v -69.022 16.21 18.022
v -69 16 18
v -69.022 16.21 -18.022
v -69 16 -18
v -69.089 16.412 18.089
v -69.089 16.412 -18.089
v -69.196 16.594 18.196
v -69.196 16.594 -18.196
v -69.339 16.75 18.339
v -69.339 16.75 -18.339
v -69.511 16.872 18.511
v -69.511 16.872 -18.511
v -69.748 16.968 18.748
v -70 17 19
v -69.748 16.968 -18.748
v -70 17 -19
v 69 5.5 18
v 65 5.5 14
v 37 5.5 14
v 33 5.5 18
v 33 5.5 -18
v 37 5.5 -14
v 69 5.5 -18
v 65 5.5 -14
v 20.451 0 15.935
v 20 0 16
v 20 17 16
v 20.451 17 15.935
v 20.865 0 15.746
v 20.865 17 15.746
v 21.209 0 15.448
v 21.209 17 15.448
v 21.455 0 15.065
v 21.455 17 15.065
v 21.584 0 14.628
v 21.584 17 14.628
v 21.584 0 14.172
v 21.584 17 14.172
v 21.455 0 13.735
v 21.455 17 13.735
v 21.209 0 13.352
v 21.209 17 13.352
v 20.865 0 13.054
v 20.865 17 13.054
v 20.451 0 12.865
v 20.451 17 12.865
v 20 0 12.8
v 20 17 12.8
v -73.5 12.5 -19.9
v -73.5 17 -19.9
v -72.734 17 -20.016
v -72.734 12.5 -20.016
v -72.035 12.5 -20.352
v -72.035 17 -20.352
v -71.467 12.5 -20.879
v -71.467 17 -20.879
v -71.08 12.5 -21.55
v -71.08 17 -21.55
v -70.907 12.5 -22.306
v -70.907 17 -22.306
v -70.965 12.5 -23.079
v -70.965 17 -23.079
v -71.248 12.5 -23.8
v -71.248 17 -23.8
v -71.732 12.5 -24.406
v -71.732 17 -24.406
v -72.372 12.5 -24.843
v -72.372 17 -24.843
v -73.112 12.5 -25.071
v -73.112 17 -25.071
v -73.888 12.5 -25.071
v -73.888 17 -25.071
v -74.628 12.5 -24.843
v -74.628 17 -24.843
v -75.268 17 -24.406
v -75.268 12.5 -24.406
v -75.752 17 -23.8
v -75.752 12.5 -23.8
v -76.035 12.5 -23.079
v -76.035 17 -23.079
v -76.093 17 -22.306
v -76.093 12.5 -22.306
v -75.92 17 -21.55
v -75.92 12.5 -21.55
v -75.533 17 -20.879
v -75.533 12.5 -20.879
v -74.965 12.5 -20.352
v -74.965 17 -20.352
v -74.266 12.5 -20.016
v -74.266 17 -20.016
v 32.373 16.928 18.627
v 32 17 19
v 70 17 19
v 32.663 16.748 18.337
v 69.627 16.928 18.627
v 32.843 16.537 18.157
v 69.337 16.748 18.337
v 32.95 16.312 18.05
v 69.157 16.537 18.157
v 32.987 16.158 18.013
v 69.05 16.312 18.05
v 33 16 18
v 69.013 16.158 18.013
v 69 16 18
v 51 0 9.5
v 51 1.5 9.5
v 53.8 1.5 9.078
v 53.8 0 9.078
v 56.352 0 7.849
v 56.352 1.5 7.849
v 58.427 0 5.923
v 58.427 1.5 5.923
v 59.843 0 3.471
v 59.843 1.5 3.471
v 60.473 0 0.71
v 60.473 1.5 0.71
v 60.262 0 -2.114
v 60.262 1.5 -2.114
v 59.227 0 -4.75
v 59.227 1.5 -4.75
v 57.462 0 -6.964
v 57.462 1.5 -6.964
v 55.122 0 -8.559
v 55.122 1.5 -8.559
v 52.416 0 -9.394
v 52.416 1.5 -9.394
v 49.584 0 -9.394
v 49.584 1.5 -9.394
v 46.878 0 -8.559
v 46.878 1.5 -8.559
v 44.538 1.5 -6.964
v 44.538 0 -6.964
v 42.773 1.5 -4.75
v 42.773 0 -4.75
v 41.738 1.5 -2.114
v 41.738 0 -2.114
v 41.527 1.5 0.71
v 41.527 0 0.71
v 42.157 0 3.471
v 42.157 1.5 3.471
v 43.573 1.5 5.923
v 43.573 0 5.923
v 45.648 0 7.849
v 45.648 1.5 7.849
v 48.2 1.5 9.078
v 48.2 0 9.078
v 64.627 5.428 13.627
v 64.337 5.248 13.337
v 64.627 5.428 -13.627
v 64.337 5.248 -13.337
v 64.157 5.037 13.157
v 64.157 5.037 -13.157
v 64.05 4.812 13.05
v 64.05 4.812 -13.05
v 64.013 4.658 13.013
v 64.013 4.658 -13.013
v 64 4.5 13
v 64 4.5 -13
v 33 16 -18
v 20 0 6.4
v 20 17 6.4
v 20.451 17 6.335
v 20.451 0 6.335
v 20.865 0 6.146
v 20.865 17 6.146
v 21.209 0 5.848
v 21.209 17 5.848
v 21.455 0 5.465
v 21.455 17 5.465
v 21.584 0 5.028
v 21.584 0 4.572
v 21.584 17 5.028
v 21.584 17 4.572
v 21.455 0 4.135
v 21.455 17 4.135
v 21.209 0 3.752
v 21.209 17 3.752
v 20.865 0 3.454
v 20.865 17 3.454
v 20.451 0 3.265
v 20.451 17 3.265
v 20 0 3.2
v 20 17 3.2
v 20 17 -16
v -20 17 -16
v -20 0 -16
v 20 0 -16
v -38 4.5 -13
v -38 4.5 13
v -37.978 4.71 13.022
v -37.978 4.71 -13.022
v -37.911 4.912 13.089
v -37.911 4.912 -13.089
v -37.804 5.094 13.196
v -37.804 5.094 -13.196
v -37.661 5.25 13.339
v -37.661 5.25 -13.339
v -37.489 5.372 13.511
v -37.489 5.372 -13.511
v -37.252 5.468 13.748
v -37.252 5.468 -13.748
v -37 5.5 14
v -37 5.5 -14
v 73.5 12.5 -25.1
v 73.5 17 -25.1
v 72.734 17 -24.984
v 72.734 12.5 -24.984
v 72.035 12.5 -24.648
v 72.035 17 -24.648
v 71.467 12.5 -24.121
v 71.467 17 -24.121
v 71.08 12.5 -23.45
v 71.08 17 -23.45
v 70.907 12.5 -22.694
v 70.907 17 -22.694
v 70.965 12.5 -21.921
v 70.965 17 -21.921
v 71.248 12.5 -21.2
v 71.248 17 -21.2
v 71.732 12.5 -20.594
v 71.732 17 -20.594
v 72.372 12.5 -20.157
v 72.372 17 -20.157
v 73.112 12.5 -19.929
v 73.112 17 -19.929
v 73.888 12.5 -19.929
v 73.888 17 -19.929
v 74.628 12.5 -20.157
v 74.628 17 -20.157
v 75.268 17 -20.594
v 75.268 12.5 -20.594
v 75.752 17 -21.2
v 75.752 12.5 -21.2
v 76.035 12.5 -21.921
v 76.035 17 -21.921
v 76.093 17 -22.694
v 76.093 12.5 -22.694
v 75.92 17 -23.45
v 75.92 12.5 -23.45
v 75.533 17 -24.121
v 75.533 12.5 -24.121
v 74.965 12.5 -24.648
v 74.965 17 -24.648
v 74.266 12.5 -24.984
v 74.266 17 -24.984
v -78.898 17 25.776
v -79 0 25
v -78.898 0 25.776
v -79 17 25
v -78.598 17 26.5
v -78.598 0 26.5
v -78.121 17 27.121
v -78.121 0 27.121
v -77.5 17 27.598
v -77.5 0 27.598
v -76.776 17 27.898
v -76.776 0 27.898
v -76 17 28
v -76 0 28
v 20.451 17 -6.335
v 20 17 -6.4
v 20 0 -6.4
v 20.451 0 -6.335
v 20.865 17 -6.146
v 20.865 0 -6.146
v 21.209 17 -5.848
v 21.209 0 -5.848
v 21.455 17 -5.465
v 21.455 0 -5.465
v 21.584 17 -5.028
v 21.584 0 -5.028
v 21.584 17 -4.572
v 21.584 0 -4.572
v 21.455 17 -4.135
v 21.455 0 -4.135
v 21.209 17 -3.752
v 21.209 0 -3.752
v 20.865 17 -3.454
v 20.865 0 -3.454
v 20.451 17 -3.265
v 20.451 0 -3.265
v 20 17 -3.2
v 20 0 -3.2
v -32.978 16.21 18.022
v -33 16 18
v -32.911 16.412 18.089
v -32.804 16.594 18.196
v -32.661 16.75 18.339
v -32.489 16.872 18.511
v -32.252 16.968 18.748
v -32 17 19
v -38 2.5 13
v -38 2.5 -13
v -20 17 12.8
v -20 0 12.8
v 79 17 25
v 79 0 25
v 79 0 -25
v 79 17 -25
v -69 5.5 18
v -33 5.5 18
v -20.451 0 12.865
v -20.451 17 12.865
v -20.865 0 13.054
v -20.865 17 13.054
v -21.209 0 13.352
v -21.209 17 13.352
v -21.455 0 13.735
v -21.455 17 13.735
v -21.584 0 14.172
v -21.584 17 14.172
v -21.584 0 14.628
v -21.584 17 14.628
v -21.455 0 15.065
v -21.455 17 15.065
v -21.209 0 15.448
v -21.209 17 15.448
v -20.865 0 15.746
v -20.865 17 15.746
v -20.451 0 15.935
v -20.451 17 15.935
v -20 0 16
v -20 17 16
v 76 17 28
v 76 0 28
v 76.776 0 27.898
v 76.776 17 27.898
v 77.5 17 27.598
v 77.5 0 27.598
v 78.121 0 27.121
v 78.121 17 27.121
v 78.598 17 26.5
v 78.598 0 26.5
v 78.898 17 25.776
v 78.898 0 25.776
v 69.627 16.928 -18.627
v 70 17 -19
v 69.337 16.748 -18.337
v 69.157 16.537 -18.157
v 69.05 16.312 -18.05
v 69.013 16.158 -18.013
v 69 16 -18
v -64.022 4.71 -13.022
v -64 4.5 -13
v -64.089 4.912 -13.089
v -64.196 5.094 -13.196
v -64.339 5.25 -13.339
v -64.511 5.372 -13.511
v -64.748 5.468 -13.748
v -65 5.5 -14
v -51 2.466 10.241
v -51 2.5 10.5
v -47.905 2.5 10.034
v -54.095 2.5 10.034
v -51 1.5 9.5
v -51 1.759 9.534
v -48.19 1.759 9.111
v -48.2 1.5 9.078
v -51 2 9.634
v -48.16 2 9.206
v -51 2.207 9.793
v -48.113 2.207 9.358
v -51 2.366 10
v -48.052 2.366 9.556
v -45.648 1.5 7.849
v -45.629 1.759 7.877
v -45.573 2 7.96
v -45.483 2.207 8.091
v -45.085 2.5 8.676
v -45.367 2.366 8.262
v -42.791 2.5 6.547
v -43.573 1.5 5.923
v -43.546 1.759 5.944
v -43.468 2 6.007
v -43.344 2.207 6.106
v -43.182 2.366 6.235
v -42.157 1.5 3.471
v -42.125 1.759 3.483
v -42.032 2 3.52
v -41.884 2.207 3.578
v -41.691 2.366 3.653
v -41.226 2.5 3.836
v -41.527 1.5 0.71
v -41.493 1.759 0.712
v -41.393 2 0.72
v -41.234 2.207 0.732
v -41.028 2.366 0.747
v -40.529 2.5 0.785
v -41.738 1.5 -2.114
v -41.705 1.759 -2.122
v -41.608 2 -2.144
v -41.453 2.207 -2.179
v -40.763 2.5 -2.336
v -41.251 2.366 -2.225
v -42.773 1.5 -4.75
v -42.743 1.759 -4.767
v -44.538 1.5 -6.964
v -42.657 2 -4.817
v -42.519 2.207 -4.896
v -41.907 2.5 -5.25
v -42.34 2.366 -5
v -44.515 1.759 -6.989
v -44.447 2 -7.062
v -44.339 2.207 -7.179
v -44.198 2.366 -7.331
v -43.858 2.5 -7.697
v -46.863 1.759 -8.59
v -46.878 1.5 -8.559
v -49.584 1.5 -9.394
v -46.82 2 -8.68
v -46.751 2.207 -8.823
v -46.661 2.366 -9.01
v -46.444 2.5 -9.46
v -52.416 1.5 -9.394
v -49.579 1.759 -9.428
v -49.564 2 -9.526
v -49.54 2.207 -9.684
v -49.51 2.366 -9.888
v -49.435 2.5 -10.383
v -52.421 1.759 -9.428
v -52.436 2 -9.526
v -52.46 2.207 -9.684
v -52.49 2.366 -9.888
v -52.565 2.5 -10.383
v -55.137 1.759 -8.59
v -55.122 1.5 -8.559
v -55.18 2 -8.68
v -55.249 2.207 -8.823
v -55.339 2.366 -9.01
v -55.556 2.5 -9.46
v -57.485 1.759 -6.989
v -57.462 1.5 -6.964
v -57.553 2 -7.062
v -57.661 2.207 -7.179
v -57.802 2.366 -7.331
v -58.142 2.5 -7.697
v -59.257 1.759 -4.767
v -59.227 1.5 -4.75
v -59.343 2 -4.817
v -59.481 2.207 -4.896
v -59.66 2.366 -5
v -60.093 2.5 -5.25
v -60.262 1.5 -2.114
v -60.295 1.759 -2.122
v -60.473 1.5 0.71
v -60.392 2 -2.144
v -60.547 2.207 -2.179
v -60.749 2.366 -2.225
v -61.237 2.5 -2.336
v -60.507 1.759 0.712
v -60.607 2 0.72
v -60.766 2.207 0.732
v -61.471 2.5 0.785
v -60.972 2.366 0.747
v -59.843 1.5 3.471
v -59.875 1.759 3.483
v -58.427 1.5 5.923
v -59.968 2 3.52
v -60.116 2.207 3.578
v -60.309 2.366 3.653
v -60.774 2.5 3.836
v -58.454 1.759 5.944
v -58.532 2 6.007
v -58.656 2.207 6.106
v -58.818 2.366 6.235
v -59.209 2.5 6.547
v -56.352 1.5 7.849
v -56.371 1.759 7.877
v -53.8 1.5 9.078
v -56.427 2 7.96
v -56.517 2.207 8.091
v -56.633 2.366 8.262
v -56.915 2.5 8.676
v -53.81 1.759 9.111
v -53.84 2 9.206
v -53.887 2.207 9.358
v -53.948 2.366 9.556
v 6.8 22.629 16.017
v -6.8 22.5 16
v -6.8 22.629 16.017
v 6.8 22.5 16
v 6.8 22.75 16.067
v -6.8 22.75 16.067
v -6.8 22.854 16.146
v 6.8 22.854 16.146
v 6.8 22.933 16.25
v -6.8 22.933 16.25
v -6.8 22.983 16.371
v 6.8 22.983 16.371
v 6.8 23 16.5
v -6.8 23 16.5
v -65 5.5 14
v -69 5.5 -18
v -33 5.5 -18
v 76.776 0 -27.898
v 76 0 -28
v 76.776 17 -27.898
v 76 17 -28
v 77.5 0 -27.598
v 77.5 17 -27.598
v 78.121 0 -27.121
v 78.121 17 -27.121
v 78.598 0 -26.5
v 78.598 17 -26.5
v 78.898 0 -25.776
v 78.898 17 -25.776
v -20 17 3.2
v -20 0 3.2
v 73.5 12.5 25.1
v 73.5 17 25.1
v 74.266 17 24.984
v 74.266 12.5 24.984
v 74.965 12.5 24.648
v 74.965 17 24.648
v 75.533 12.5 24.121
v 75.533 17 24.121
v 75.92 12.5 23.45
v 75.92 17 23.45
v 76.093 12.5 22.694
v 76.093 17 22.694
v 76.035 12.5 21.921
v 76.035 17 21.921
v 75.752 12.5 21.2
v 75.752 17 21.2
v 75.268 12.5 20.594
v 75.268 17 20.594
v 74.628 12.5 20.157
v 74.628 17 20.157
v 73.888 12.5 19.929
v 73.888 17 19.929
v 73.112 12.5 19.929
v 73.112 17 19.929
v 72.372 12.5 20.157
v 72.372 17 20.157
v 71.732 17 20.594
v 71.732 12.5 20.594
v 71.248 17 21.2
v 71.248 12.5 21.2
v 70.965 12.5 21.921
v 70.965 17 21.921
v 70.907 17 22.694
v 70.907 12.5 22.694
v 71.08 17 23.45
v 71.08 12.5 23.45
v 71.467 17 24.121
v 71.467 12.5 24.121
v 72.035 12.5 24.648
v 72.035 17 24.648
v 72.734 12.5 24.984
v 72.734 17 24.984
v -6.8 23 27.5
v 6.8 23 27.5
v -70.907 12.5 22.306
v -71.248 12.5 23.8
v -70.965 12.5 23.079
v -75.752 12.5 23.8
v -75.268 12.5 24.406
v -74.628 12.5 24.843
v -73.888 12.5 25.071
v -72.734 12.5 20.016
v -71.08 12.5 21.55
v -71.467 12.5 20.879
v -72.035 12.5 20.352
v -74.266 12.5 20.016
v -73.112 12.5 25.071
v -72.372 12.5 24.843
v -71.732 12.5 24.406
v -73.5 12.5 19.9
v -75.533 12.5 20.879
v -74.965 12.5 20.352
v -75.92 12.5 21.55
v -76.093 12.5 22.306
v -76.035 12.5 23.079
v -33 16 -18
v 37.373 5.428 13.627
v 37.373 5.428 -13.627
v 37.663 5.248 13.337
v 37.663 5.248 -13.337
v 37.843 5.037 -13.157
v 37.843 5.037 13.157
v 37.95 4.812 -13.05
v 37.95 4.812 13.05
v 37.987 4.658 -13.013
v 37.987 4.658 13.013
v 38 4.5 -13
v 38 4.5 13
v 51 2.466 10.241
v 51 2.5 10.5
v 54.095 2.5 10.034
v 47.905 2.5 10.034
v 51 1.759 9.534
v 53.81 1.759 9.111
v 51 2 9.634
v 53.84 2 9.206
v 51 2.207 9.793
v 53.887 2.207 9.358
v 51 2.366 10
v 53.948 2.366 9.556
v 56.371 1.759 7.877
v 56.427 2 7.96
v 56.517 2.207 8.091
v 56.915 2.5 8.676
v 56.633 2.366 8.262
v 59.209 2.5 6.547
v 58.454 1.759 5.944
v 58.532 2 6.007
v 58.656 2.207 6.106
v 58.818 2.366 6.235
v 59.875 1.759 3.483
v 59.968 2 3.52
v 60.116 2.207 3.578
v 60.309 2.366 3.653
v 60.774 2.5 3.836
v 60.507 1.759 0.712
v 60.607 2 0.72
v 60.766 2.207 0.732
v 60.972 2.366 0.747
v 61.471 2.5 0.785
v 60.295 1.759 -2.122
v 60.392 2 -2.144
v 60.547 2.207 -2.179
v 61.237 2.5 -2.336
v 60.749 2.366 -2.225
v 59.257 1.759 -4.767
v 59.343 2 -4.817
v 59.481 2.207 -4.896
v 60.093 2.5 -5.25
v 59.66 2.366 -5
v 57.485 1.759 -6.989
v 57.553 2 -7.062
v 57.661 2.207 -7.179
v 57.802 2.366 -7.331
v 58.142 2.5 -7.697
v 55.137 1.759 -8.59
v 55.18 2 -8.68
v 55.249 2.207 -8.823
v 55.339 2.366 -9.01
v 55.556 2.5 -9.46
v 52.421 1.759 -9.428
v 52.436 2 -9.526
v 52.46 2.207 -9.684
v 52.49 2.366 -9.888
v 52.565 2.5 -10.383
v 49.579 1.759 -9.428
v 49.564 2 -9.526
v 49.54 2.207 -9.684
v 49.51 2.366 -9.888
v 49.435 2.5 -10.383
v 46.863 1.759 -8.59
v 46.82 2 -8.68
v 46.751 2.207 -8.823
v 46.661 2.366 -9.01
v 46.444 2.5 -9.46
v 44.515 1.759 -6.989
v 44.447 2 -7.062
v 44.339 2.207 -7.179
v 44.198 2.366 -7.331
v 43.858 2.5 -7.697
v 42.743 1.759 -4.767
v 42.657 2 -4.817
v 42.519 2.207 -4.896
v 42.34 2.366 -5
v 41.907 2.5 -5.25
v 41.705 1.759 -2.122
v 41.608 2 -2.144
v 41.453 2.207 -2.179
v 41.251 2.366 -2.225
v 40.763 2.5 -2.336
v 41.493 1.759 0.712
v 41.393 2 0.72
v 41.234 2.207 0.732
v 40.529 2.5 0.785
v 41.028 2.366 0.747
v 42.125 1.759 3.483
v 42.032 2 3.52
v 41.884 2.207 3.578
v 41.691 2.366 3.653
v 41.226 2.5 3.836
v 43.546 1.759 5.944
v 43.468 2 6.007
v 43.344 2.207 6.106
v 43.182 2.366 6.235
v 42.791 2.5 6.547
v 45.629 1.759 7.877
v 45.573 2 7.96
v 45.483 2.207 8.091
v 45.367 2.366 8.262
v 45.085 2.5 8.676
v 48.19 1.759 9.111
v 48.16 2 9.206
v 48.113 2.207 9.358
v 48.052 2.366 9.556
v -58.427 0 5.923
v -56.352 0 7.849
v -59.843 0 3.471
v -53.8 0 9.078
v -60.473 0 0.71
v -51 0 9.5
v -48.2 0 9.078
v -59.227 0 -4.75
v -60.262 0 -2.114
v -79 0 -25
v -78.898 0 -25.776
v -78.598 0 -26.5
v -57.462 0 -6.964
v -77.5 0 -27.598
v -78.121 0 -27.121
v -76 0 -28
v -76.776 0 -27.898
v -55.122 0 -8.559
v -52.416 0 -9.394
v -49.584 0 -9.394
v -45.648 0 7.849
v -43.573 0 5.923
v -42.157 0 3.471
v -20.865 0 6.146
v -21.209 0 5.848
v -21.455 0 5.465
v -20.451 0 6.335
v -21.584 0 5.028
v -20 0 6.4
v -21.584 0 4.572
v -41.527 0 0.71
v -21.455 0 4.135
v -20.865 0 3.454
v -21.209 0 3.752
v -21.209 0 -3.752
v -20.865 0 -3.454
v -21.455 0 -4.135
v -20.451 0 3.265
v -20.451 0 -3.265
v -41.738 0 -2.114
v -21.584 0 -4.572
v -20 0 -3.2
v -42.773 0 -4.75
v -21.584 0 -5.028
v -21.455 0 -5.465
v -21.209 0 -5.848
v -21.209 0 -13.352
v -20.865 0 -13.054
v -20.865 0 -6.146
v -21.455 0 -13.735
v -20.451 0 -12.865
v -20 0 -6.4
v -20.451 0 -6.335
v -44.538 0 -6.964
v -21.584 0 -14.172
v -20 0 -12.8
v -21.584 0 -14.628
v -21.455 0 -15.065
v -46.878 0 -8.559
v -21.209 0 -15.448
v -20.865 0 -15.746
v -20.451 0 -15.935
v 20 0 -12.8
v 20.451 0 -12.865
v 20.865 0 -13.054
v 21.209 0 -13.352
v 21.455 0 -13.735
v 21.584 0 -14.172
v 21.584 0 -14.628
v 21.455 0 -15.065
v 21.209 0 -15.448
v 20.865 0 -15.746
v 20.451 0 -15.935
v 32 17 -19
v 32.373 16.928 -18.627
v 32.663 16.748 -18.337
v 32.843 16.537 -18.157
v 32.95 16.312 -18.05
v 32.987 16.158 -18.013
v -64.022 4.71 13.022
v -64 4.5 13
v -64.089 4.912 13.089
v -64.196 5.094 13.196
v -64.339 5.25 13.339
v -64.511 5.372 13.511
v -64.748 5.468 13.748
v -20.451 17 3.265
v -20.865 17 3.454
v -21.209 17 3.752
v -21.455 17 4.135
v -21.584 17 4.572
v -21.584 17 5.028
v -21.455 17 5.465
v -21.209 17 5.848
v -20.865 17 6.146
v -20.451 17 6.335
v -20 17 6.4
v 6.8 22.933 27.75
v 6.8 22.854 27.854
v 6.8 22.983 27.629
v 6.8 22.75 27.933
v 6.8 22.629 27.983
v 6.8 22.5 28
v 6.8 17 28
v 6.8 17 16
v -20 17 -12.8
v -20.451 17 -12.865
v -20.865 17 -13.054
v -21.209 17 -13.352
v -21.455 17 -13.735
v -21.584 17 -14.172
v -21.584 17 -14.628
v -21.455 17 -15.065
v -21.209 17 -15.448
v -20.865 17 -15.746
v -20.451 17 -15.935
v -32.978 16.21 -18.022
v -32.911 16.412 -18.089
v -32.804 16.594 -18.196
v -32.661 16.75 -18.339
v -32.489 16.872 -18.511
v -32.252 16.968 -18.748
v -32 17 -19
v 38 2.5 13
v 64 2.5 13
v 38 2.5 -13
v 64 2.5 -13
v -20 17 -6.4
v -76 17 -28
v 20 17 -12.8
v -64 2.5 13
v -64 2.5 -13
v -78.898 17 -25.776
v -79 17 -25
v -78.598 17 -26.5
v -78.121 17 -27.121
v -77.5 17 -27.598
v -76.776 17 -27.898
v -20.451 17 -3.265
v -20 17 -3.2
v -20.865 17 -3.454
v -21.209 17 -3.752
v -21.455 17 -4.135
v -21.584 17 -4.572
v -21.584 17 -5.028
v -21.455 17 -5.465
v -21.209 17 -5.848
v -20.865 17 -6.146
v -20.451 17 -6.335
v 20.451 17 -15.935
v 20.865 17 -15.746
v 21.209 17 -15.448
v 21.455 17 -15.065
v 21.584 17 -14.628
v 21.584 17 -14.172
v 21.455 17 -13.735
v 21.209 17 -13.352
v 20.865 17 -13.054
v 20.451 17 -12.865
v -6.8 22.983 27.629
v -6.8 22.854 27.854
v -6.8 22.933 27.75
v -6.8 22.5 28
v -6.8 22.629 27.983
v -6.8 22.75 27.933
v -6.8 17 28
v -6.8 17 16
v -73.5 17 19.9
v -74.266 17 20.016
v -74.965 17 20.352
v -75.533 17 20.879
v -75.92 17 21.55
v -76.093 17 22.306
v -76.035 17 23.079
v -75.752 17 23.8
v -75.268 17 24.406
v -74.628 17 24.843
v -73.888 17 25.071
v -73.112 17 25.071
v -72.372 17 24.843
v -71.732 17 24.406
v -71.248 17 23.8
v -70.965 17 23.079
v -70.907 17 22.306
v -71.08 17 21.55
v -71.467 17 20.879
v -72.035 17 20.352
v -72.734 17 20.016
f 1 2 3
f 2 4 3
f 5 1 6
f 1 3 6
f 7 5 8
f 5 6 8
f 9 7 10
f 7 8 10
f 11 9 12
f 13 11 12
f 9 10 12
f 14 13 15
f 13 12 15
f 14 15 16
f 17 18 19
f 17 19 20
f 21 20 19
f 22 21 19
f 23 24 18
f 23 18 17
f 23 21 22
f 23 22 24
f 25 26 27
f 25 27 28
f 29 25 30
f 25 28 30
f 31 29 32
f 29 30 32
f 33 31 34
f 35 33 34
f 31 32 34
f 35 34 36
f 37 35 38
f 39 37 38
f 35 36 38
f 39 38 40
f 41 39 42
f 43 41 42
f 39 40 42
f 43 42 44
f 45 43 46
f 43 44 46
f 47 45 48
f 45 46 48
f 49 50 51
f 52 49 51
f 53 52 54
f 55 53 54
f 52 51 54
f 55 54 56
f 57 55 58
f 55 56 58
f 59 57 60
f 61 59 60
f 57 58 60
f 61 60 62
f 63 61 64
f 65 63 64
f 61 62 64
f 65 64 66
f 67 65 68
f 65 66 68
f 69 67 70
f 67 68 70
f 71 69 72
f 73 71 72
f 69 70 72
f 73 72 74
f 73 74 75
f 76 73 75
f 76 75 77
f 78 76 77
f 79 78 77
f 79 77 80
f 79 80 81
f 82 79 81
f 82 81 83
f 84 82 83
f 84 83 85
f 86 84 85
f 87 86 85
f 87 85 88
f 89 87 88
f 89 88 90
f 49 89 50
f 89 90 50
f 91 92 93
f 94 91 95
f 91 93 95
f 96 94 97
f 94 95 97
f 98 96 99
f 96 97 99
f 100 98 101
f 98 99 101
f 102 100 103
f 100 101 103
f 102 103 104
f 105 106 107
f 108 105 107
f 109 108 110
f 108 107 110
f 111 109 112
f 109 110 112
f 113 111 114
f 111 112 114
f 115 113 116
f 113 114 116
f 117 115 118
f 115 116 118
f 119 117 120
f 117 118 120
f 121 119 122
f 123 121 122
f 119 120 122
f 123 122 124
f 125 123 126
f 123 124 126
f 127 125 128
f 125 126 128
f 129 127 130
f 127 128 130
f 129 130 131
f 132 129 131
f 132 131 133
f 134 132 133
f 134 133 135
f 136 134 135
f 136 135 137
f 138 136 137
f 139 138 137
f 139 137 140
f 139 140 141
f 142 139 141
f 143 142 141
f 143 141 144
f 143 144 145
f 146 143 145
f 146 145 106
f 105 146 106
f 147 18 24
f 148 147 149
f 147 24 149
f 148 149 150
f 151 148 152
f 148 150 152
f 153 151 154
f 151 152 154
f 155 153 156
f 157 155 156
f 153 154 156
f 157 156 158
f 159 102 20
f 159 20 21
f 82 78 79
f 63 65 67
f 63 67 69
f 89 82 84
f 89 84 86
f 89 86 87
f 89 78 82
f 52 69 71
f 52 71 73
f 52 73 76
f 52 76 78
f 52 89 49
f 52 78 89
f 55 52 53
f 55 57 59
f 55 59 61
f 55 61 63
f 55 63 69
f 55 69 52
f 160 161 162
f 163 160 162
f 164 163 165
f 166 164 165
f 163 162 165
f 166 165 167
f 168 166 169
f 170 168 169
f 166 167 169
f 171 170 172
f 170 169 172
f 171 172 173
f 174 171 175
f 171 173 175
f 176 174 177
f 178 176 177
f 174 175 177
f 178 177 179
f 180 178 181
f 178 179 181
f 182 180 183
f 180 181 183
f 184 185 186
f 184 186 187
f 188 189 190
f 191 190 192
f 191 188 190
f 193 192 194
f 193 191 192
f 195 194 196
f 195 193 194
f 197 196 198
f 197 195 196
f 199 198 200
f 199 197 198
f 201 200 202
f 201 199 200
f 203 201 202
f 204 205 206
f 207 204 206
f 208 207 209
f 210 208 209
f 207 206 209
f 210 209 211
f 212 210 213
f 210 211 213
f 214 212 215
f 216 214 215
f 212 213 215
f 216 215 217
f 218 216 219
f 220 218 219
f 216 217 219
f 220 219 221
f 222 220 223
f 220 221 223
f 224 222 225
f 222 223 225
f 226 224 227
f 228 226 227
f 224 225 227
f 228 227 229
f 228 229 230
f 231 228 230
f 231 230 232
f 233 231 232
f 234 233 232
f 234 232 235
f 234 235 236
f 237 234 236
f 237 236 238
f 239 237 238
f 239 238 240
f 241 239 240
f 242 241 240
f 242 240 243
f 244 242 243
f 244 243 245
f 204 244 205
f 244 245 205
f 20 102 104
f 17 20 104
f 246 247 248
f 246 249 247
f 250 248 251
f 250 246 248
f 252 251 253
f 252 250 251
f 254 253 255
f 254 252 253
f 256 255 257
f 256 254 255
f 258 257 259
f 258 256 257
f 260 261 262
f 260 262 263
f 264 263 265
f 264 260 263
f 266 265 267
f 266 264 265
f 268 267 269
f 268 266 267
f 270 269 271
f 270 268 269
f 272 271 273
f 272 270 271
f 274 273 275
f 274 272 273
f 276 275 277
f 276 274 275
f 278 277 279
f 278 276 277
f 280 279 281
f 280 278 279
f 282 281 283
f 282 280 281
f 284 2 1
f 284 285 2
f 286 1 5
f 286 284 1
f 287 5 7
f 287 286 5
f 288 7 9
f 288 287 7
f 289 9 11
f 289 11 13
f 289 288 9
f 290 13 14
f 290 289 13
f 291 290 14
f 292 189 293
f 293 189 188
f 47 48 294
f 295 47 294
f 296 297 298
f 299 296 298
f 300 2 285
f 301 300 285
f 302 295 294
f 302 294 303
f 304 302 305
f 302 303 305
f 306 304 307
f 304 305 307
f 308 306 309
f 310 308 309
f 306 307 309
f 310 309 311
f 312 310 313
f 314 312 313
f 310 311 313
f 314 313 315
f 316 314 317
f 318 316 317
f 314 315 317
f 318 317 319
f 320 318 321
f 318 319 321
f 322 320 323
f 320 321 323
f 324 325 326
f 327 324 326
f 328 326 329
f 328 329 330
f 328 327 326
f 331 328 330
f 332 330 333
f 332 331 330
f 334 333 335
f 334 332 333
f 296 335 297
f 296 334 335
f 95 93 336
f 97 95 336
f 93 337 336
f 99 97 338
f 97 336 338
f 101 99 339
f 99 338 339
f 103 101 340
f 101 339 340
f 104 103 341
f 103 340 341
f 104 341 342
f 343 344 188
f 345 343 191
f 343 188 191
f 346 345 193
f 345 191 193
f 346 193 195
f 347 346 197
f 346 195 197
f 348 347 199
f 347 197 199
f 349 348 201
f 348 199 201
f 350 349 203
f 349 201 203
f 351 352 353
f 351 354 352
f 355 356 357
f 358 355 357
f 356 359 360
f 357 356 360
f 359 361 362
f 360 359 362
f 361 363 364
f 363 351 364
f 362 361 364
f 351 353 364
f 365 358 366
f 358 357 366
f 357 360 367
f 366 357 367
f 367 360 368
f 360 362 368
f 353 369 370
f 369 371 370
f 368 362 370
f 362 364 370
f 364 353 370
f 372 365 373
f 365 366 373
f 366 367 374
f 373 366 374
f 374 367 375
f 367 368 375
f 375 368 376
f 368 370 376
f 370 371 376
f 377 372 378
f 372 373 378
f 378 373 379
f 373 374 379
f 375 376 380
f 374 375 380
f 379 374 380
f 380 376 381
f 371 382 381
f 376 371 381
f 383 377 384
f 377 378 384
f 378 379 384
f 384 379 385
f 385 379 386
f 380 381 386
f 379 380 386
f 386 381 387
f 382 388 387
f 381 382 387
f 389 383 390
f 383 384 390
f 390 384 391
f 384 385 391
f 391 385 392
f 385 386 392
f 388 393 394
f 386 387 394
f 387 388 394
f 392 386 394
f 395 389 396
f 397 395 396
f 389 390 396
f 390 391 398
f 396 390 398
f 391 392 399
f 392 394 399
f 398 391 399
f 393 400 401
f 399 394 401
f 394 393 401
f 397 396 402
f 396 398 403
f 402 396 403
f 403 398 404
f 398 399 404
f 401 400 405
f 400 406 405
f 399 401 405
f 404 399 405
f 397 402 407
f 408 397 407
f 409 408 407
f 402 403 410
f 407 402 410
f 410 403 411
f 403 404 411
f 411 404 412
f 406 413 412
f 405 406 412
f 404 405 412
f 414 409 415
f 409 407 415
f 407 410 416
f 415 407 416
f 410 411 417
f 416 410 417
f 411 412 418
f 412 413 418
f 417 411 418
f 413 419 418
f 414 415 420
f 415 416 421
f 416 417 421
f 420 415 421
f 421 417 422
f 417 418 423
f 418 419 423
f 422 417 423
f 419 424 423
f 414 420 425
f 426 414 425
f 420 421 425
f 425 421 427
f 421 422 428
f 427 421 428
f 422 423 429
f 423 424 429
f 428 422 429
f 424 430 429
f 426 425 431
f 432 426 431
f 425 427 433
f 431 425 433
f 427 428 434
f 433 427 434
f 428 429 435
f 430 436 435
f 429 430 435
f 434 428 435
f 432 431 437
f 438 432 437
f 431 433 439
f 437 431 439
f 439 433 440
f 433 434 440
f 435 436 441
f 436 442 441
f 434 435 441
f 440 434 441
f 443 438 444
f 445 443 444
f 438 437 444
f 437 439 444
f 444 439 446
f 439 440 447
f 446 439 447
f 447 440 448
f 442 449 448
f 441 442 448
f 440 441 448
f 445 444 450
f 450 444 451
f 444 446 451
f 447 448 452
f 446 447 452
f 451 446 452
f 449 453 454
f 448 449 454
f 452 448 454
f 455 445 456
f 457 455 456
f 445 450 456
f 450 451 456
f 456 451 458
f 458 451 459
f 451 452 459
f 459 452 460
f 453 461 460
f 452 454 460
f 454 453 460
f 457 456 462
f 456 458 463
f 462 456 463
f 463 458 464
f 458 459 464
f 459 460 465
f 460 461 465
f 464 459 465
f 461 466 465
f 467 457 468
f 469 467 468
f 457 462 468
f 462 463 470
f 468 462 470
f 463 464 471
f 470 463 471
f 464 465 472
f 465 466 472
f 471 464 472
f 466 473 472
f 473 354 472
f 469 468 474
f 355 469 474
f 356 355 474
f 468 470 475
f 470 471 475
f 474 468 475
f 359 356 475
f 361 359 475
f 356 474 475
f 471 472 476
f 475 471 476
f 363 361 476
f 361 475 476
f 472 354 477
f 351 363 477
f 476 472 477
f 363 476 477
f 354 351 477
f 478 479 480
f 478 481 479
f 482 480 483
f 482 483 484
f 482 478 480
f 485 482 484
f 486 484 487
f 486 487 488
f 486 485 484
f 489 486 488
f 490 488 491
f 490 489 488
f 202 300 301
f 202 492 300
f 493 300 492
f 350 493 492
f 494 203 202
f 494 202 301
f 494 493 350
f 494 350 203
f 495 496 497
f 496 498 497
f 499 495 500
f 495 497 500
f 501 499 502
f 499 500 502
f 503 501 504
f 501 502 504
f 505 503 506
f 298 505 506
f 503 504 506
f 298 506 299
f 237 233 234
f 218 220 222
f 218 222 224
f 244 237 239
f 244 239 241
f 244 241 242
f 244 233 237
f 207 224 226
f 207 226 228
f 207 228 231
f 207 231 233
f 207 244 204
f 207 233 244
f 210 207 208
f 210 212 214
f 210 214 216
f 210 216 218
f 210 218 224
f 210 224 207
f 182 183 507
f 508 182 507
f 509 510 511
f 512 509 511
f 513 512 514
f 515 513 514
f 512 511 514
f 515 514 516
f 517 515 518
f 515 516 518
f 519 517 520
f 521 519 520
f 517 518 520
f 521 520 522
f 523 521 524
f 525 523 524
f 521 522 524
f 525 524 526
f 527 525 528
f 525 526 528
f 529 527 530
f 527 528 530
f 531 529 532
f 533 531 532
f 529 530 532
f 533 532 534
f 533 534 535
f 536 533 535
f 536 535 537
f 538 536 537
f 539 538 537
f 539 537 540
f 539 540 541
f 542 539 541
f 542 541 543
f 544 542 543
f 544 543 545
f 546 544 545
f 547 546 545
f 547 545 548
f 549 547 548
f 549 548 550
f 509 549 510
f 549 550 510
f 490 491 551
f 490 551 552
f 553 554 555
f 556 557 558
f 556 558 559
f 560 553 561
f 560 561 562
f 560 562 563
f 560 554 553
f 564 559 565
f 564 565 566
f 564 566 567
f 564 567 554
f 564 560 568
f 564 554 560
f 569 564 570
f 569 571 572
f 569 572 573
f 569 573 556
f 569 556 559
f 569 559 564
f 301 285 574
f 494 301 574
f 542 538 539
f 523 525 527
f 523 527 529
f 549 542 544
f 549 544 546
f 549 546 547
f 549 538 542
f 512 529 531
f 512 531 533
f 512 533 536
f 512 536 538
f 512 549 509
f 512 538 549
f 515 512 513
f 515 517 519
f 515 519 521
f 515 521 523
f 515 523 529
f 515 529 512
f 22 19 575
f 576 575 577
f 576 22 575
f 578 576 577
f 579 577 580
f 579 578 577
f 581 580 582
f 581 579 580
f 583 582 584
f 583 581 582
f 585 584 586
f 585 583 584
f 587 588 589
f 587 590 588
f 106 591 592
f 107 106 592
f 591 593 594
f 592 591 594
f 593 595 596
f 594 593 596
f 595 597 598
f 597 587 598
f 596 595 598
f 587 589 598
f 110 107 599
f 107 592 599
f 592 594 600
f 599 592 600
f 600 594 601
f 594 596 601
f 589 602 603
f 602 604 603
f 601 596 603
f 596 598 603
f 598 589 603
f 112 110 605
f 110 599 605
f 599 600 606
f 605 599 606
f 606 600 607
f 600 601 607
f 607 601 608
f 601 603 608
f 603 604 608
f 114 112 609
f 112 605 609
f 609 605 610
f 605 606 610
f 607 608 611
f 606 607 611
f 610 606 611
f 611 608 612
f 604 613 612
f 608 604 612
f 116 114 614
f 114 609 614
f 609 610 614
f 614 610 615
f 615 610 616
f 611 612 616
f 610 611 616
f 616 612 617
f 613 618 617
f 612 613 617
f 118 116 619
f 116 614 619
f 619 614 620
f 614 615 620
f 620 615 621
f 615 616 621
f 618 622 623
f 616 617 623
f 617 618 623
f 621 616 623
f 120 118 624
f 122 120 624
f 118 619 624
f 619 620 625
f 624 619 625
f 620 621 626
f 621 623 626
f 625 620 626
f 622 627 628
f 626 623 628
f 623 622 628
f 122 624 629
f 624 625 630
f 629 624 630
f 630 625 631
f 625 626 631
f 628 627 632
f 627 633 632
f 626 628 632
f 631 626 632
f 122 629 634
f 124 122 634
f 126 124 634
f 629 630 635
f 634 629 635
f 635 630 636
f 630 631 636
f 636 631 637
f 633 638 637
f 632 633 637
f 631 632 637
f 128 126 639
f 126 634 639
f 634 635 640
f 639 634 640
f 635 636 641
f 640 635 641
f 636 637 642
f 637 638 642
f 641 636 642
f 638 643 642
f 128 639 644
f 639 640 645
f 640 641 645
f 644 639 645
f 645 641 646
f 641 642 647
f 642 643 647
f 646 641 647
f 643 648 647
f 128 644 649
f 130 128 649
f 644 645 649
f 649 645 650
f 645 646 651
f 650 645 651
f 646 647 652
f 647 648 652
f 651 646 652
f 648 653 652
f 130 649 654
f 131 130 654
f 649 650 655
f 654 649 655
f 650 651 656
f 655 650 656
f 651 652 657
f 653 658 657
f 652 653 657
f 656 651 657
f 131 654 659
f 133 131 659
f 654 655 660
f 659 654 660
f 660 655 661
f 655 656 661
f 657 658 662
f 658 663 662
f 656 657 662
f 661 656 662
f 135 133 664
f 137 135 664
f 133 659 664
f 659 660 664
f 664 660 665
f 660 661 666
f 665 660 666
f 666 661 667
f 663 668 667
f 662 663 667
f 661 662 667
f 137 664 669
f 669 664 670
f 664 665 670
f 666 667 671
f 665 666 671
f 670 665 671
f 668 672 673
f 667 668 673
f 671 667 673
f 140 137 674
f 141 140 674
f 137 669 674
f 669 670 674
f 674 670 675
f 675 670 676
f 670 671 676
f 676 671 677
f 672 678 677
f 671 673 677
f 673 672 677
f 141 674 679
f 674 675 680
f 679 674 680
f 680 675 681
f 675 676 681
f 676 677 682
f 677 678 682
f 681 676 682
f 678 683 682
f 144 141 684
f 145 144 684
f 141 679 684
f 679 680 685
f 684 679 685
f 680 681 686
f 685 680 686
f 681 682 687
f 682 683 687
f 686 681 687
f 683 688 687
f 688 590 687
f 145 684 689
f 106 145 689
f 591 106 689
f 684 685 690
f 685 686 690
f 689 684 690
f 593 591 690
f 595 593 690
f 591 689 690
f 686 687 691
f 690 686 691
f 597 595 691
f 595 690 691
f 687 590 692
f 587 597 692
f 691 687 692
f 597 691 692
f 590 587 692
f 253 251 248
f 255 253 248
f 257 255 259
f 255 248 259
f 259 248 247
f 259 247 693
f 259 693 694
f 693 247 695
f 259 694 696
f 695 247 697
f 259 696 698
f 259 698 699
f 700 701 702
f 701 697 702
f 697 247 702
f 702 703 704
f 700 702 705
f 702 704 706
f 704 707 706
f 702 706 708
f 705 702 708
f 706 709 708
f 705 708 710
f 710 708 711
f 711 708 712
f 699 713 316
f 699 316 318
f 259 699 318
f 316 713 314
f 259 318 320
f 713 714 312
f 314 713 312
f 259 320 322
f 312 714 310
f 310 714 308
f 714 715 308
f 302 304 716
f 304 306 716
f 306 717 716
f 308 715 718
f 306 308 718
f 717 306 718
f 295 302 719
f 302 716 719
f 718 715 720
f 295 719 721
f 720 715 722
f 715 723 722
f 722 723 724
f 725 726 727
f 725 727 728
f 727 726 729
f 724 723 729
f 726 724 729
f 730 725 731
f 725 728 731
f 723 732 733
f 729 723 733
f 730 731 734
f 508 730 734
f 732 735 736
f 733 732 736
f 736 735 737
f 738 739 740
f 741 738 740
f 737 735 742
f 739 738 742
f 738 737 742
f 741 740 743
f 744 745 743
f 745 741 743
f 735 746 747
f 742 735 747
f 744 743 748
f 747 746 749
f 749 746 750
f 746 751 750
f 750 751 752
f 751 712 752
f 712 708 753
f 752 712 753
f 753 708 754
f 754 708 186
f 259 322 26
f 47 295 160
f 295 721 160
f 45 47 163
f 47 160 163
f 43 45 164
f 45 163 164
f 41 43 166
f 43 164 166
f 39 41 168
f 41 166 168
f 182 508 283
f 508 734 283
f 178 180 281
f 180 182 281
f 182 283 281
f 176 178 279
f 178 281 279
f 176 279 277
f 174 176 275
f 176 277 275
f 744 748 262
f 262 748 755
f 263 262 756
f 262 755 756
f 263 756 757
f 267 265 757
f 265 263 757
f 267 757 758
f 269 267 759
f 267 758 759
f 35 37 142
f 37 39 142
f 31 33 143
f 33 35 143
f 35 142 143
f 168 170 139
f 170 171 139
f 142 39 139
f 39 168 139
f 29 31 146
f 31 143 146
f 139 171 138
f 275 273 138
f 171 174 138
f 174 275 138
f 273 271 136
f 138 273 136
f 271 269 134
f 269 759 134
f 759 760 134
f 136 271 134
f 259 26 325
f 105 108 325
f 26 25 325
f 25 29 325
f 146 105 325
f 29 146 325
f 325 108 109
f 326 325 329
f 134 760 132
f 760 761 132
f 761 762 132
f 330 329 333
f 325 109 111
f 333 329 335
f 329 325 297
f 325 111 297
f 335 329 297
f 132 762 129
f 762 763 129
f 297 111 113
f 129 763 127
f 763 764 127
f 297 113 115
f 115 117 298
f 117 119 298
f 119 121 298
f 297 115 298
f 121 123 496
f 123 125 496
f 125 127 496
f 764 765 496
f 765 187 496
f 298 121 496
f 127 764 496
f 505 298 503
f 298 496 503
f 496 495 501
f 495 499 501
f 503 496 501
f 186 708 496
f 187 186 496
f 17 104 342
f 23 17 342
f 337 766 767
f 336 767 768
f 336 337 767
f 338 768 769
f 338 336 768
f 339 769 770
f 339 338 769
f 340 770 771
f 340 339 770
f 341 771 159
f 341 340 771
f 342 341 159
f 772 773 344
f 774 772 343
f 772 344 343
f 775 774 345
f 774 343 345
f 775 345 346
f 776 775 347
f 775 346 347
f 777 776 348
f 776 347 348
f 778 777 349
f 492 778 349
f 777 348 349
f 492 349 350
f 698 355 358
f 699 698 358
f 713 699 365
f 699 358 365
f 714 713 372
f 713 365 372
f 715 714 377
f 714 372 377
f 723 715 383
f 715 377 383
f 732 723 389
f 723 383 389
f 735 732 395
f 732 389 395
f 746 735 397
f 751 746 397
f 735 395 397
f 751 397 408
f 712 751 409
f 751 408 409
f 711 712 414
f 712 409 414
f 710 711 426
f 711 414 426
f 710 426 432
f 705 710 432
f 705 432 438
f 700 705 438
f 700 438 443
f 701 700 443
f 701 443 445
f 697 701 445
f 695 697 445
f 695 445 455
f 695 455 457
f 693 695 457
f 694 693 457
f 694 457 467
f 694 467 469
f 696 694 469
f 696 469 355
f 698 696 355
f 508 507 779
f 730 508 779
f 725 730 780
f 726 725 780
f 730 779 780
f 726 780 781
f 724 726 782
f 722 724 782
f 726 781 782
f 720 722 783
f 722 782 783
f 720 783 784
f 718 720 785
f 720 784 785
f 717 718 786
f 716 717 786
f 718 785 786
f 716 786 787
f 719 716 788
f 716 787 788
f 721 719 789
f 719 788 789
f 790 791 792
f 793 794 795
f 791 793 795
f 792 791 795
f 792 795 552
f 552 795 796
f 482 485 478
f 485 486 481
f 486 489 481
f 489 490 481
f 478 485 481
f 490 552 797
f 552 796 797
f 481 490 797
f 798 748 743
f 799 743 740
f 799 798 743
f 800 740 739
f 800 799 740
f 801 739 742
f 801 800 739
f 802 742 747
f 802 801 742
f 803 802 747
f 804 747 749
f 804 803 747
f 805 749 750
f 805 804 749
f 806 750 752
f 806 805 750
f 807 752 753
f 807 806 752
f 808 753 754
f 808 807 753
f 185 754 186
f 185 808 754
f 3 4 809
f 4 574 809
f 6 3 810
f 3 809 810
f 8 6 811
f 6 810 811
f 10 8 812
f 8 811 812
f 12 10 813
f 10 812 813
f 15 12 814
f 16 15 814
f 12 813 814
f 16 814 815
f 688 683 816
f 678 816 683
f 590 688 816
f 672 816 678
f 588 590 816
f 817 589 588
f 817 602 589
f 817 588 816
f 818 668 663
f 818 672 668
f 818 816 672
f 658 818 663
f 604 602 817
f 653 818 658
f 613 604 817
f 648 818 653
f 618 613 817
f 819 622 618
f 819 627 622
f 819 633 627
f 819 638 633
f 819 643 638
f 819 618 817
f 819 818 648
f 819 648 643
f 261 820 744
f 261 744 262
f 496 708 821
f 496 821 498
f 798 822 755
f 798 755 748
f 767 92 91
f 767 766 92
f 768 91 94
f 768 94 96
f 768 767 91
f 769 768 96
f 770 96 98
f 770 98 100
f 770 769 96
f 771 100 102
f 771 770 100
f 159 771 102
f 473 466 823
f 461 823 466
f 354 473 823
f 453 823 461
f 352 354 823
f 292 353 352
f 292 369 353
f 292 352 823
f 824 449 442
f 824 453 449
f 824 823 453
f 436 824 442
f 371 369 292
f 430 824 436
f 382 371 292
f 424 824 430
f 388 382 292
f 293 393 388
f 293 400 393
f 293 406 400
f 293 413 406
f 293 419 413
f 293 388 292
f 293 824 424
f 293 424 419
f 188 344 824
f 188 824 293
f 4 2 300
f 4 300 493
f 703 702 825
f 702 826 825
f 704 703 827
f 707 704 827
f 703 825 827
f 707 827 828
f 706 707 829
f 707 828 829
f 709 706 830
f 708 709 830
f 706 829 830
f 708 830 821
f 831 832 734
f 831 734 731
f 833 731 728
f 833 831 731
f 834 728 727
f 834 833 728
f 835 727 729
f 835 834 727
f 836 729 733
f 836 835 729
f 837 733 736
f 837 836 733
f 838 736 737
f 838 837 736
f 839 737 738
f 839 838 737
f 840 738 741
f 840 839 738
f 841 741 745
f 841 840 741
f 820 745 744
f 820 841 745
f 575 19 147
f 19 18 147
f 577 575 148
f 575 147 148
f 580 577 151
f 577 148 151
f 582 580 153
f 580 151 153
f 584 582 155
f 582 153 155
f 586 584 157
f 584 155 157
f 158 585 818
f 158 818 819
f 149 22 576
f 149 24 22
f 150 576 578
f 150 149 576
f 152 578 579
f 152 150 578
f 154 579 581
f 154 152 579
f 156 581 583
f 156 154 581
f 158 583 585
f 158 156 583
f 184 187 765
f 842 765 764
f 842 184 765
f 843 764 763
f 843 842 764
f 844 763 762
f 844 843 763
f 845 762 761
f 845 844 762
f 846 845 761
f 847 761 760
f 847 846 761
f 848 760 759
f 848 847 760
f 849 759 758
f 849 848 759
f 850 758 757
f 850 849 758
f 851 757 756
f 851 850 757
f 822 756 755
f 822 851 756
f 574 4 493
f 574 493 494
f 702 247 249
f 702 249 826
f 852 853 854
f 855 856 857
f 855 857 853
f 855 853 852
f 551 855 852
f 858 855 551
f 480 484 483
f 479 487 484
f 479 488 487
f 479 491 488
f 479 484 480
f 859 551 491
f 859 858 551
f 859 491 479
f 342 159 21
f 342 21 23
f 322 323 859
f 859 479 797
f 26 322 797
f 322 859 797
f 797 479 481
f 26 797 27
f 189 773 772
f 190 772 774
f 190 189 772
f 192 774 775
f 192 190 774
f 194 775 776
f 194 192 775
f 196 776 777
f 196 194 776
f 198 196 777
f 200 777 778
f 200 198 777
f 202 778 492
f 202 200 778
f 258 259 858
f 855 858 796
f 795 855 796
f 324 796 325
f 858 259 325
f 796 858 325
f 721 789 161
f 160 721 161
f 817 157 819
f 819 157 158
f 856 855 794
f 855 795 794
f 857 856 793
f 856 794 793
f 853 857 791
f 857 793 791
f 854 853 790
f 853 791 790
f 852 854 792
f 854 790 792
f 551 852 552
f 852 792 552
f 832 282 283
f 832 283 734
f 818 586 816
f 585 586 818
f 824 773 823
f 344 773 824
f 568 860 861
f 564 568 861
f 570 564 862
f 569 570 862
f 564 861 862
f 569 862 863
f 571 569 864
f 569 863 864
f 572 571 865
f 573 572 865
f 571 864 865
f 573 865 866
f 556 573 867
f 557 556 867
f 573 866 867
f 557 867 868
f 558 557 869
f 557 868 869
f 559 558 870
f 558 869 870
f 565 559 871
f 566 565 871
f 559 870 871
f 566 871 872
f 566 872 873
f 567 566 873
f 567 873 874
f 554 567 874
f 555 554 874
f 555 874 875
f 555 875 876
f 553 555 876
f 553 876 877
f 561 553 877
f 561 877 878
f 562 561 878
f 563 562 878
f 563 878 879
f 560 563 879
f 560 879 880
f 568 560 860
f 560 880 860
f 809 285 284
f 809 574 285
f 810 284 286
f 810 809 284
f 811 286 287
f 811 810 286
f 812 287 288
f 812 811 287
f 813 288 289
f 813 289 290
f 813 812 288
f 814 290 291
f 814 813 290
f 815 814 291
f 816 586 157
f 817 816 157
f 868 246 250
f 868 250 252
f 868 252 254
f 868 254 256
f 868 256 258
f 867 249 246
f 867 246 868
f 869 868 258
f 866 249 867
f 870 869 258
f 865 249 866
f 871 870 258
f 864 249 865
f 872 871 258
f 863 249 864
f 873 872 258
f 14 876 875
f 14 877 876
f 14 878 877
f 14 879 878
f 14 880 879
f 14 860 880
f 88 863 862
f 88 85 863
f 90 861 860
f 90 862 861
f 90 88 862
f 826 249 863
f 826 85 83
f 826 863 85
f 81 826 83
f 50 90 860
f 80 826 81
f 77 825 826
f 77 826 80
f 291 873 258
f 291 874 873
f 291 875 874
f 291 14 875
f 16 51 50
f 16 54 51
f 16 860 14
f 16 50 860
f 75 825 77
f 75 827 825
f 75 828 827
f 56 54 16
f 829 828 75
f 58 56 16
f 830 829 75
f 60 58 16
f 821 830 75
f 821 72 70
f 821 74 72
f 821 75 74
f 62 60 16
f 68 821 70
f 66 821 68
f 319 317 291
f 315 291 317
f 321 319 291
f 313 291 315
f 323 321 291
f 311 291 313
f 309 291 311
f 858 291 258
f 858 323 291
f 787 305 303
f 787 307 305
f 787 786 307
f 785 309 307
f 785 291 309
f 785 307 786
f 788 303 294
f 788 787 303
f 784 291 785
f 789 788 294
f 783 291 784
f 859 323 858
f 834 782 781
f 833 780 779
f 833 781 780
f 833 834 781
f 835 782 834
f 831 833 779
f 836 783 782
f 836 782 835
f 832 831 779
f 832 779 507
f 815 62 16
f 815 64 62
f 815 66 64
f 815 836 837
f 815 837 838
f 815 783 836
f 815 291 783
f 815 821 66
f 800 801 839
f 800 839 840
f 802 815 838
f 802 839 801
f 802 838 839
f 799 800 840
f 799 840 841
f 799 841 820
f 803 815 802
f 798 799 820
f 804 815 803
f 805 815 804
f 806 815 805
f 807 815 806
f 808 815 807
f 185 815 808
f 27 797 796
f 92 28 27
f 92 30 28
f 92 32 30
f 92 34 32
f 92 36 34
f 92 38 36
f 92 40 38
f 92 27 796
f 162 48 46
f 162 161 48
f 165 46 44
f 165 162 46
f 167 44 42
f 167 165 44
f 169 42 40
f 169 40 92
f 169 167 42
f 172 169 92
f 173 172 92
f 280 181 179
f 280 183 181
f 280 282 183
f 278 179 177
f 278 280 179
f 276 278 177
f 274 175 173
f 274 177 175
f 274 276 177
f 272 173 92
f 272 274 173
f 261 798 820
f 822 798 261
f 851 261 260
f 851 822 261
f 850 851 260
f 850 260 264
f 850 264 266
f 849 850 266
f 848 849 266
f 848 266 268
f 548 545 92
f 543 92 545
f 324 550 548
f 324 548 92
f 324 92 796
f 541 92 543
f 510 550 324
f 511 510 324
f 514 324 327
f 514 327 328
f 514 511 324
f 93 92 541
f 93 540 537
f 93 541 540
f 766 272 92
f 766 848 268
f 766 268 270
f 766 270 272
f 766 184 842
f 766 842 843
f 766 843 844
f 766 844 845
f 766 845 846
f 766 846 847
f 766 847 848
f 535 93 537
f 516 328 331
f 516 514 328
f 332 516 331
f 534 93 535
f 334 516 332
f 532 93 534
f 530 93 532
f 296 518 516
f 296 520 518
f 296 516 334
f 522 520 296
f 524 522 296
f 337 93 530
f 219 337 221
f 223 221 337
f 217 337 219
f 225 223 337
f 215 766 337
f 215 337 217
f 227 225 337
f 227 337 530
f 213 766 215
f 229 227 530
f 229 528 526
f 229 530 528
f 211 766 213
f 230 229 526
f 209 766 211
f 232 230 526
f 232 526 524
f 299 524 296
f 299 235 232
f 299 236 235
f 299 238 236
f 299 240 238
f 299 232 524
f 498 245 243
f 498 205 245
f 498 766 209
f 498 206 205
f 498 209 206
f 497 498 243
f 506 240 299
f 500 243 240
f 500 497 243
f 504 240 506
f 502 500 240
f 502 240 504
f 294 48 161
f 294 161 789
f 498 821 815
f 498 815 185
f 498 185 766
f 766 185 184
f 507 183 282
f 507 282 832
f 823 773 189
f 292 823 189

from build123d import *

# Parameters (mm, degrees)
SKETCH1_W           = 158
SKETCH1_H           = 56
BOSS_EXTRUDE1_DEPTH = 17
SKETCH8_W           = 13.6
SKETCH8_H           = 12
BOSS_EXTRUDE2_DEPTH = 6
SKETCH2_W           = 36
SKETCH2_H           = 36
CUT_EXTRUDE1_DEPTH  = 11.5
SKETCH3_W           = 26
SKETCH3_H           = 26
CUT_EXTRUDE2_DEPTH  = 3
CUT_EXTRUDE3_REACH  = 88.286
SKETCH4_R           = 9.5
SKETCH5_R           = 2.6
CUT_EXTRUDE4_DEPTH  = 4.5
CUT_EXTRUDE5_REACH  = 87.522
FILLET1_R           = 3
FILLET2_R           = 1
FILLET3_R           = 1
FILLET4_R           = 1
FILLET5_R           = 0.5


with BuildPart() as part:
    # Sketch1 → Boss-Extrude1 (new body)
    with BuildSketch(Plane(origin=(0, 0, 0), x_dir=(1, 0, 0), z_dir=(0, 1, 0))):
        Rectangle(SKETCH1_W, SKETCH1_H)
    extrude(amount=BOSS_EXTRUDE1_DEPTH)

    # Sketch8 → Boss-Extrude2 (add)
    with BuildSketch(Plane(origin=(0, 17, 0), x_dir=(1, 0, 0), z_dir=(0, 1, 0))):
        with Locations((0, -22)):
            Rectangle(SKETCH8_W, SKETCH8_H)
    extrude(amount=BOSS_EXTRUDE2_DEPTH)

    # Sketch2 → Cut-Extrude1 (cut)
    with BuildSketch(Plane(origin=(0, 17, 0), x_dir=(1, 0, 0), z_dir=(0, 1, 0))):
        with Locations((-51, 0)):
            Rectangle(SKETCH2_W, SKETCH2_H)
        with Locations((51, 0)):
            Rectangle(SKETCH2_W, SKETCH2_H)
    extrude(amount=-CUT_EXTRUDE1_DEPTH, mode=Mode.SUBTRACT)

    # Sketch3 → Cut-Extrude2 (cut)
    with BuildSketch(Plane(origin=(0, 5.5, 0), x_dir=(1, 0, 0), z_dir=(0, 1, 0))):
        with Locations((51, 0)):
            Rectangle(SKETCH3_W, SKETCH3_H)
        with Locations((-51, 0)):
            Rectangle(SKETCH3_W, SKETCH3_H)
    extrude(amount=-CUT_EXTRUDE2_DEPTH, mode=Mode.SUBTRACT)

    # Sketch4 → Cut-Extrude3 (cut, up to next)
    with BuildSketch(Plane(origin=(0, 2.5, 0), x_dir=(1, 0, 0), z_dir=(0, 1, 0)), mode=Mode.PRIVATE) as cut_extrude3_sk1:
        with Locations(Location((-51, 0, 0), (0, 0, 270))):
            Circle(SKETCH4_R)
    cut_extrude3_tool1 = extrude(cut_extrude3_sk1.sketch, amount=-CUT_EXTRUDE3_REACH, mode=Mode.PRIVATE) & part.part
    # Sketch4 → Cut-Extrude3 (cut, up to next)
    with BuildSketch(Plane(origin=(0, 2.5, 0), x_dir=(1, 0, 0), z_dir=(0, 1, 0)), mode=Mode.PRIVATE) as cut_extrude3_sk2:
        with Locations(Location((51, 0, 0), (0, 0, 270))):
            Circle(SKETCH4_R)
    cut_extrude3_tool2 = extrude(cut_extrude3_sk2.sketch, amount=-CUT_EXTRUDE3_REACH, mode=Mode.PRIVATE) & part.part
    add(cut_extrude3_tool1.solids().sort_by_distance((-51, 2.5, 0))[0], mode=Mode.SUBTRACT)
    add(cut_extrude3_tool2.solids().sort_by_distance((51, 2.5, 0))[0], mode=Mode.SUBTRACT)

    # Sketch5 → Cut-Extrude4 (cut)
    with BuildSketch(Plane(origin=(0, 17, 0), x_dir=(1, 0, 0), z_dir=(0, 1, 0))):
        with Locations(Location((-73.5, 22.5, 0), (0, 0, 270))):
            Circle(SKETCH5_R)
        with Locations(Location((73.5, 22.5, 0), (0, 0, 90))):
            Circle(SKETCH5_R)
        with Locations(Location((73.5, -22.5, 0), (0, 0, 270))):
            Circle(SKETCH5_R)
        with Locations(Location((-73.5, -22.5, 0), (0, 0, 90))):
            Circle(SKETCH5_R)
    extrude(amount=-CUT_EXTRUDE4_DEPTH, mode=Mode.SUBTRACT)

    # Sketch6 → Cut-Extrude5 (cut, up to next)
    with BuildSketch(Plane(origin=(0, 17, 0), x_dir=(1, 0, 0), z_dir=(0, 1, 0)), mode=Mode.PRIVATE) as cut_extrude5_sk1:
        with BuildLine():
            Line((-20, 6.4), (20, 6.4))
            ThreePointArc((20, 6.4), (21.6, 4.8), (20, 3.2))
            Line((20, 3.2), (-20, 3.2))
            ThreePointArc((-20, 3.2), (-21.6, 4.8), (-20, 6.4))
        make_face()
    cut_extrude5_tool1 = extrude(cut_extrude5_sk1.sketch, amount=-CUT_EXTRUDE5_REACH, mode=Mode.PRIVATE) & part.part
    # Sketch6 → Cut-Extrude5 (cut, up to next)
    with BuildSketch(Plane(origin=(0, 17, 0), x_dir=(1, 0, 0), z_dir=(0, 1, 0)), mode=Mode.PRIVATE) as cut_extrude5_sk2:
        with BuildLine():
            Line((-20, 16), (20, 16))
            ThreePointArc((20, 16), (21.6, 14.4), (20, 12.8))
            Line((20, 12.8), (-20, 12.8))
            ThreePointArc((-20, 12.8), (-21.6, 14.4), (-20, 16))
        make_face()
    cut_extrude5_tool2 = extrude(cut_extrude5_sk2.sketch, amount=-CUT_EXTRUDE5_REACH, mode=Mode.PRIVATE) & part.part
    # Sketch6 → Cut-Extrude5 (cut, up to next)
    with BuildSketch(Plane(origin=(0, 17, 0), x_dir=(1, 0, 0), z_dir=(0, 1, 0)), mode=Mode.PRIVATE) as cut_extrude5_sk3:
        with BuildLine():
            Line((-20, -6.4), (20, -6.4))
            ThreePointArc((20, -6.4), (21.6, -4.8), (20, -3.2))
            Line((20, -3.2), (-20, -3.2))
            ThreePointArc((-20, -3.2), (-21.6, -4.8), (-20, -6.4))
        make_face()
    cut_extrude5_tool3 = extrude(cut_extrude5_sk3.sketch, amount=-CUT_EXTRUDE5_REACH, mode=Mode.PRIVATE) & part.part
    # Sketch6 → Cut-Extrude5 (cut, up to next)
    with BuildSketch(Plane(origin=(0, 17, 0), x_dir=(1, 0, 0), z_dir=(0, 1, 0)), mode=Mode.PRIVATE) as cut_extrude5_sk4:
        with BuildLine():
            Line((-20, -16), (20, -16))
            ThreePointArc((20, -16), (21.6, -14.4), (20, -12.8))
            Line((20, -12.8), (-20, -12.8))
            ThreePointArc((-20, -12.8), (-21.6, -14.4), (-20, -16))
        make_face()
    cut_extrude5_tool4 = extrude(cut_extrude5_sk4.sketch, amount=-CUT_EXTRUDE5_REACH, mode=Mode.PRIVATE) & part.part
    add(cut_extrude5_tool1.solids().sort_by_distance((0, 17, -4.8))[0], mode=Mode.SUBTRACT)
    add(cut_extrude5_tool2.solids().sort_by_distance((0, 17, -14.4))[0], mode=Mode.SUBTRACT)
    add(cut_extrude5_tool3.solids().sort_by_distance((0, 17, 4.8))[0], mode=Mode.SUBTRACT)
    add(cut_extrude5_tool4.solids().sort_by_distance((0, 17, 14.4))[0], mode=Mode.SUBTRACT)

    # Fillet1
    fillet1_edges = [part.edges().sort_by_distance(p)[0] for p in [
        (79, 8.5, 28),
        (-79, 8.5, 28),
        (-79, 8.5, -28),
        (79, 8.5, -28),
    ]]
    fillet(fillet1_edges, radius=FILLET1_R)

    # Fillet2
    fillet2_edges = [part.edges().sort_by_distance(p)[0] for p in [
        (-51, 2.5, -9.5),
        (51, 2.5, -9.5),
    ]]
    fillet(fillet2_edges, radius=FILLET2_R)

    # Fillet3
    fillet3_edges = [part.edges().sort_by_distance(p)[0] for p in [
        (38, 5.5, 0),
        (51, 5.5, 13),
        (64, 5.5, 0),
        (51, 5.5, -13),
        (-51, 5.5, -13),
        (-64, 5.5, 0),
        (-51, 5.5, 13),
        (-38, 5.5, 0),
    ]]
    fillet(fillet3_edges, radius=FILLET3_R)

    # Fillet4
    fillet4_edges = [part.edges().sort_by_distance(p)[0] for p in [
        (-33, 17, 0),
        (-51, 17, -18),
        (-69, 17, 0),
        (-51, 17, 18),
        (69, 17, 0),
        (51, 17, -18),
        (33, 17, 0),
        (51, 17, 18),
    ]]
    fillet(fillet4_edges, radius=FILLET4_R)

    # Fillet5
    fillet5_edges = [part.edges().sort_by_distance(p)[0] for p in [
        (0, 23, 28),
        (0, 23, 16),
    ]]
    fillet(fillet5_edges, radius=FILLET5_R)


solid = part.part
